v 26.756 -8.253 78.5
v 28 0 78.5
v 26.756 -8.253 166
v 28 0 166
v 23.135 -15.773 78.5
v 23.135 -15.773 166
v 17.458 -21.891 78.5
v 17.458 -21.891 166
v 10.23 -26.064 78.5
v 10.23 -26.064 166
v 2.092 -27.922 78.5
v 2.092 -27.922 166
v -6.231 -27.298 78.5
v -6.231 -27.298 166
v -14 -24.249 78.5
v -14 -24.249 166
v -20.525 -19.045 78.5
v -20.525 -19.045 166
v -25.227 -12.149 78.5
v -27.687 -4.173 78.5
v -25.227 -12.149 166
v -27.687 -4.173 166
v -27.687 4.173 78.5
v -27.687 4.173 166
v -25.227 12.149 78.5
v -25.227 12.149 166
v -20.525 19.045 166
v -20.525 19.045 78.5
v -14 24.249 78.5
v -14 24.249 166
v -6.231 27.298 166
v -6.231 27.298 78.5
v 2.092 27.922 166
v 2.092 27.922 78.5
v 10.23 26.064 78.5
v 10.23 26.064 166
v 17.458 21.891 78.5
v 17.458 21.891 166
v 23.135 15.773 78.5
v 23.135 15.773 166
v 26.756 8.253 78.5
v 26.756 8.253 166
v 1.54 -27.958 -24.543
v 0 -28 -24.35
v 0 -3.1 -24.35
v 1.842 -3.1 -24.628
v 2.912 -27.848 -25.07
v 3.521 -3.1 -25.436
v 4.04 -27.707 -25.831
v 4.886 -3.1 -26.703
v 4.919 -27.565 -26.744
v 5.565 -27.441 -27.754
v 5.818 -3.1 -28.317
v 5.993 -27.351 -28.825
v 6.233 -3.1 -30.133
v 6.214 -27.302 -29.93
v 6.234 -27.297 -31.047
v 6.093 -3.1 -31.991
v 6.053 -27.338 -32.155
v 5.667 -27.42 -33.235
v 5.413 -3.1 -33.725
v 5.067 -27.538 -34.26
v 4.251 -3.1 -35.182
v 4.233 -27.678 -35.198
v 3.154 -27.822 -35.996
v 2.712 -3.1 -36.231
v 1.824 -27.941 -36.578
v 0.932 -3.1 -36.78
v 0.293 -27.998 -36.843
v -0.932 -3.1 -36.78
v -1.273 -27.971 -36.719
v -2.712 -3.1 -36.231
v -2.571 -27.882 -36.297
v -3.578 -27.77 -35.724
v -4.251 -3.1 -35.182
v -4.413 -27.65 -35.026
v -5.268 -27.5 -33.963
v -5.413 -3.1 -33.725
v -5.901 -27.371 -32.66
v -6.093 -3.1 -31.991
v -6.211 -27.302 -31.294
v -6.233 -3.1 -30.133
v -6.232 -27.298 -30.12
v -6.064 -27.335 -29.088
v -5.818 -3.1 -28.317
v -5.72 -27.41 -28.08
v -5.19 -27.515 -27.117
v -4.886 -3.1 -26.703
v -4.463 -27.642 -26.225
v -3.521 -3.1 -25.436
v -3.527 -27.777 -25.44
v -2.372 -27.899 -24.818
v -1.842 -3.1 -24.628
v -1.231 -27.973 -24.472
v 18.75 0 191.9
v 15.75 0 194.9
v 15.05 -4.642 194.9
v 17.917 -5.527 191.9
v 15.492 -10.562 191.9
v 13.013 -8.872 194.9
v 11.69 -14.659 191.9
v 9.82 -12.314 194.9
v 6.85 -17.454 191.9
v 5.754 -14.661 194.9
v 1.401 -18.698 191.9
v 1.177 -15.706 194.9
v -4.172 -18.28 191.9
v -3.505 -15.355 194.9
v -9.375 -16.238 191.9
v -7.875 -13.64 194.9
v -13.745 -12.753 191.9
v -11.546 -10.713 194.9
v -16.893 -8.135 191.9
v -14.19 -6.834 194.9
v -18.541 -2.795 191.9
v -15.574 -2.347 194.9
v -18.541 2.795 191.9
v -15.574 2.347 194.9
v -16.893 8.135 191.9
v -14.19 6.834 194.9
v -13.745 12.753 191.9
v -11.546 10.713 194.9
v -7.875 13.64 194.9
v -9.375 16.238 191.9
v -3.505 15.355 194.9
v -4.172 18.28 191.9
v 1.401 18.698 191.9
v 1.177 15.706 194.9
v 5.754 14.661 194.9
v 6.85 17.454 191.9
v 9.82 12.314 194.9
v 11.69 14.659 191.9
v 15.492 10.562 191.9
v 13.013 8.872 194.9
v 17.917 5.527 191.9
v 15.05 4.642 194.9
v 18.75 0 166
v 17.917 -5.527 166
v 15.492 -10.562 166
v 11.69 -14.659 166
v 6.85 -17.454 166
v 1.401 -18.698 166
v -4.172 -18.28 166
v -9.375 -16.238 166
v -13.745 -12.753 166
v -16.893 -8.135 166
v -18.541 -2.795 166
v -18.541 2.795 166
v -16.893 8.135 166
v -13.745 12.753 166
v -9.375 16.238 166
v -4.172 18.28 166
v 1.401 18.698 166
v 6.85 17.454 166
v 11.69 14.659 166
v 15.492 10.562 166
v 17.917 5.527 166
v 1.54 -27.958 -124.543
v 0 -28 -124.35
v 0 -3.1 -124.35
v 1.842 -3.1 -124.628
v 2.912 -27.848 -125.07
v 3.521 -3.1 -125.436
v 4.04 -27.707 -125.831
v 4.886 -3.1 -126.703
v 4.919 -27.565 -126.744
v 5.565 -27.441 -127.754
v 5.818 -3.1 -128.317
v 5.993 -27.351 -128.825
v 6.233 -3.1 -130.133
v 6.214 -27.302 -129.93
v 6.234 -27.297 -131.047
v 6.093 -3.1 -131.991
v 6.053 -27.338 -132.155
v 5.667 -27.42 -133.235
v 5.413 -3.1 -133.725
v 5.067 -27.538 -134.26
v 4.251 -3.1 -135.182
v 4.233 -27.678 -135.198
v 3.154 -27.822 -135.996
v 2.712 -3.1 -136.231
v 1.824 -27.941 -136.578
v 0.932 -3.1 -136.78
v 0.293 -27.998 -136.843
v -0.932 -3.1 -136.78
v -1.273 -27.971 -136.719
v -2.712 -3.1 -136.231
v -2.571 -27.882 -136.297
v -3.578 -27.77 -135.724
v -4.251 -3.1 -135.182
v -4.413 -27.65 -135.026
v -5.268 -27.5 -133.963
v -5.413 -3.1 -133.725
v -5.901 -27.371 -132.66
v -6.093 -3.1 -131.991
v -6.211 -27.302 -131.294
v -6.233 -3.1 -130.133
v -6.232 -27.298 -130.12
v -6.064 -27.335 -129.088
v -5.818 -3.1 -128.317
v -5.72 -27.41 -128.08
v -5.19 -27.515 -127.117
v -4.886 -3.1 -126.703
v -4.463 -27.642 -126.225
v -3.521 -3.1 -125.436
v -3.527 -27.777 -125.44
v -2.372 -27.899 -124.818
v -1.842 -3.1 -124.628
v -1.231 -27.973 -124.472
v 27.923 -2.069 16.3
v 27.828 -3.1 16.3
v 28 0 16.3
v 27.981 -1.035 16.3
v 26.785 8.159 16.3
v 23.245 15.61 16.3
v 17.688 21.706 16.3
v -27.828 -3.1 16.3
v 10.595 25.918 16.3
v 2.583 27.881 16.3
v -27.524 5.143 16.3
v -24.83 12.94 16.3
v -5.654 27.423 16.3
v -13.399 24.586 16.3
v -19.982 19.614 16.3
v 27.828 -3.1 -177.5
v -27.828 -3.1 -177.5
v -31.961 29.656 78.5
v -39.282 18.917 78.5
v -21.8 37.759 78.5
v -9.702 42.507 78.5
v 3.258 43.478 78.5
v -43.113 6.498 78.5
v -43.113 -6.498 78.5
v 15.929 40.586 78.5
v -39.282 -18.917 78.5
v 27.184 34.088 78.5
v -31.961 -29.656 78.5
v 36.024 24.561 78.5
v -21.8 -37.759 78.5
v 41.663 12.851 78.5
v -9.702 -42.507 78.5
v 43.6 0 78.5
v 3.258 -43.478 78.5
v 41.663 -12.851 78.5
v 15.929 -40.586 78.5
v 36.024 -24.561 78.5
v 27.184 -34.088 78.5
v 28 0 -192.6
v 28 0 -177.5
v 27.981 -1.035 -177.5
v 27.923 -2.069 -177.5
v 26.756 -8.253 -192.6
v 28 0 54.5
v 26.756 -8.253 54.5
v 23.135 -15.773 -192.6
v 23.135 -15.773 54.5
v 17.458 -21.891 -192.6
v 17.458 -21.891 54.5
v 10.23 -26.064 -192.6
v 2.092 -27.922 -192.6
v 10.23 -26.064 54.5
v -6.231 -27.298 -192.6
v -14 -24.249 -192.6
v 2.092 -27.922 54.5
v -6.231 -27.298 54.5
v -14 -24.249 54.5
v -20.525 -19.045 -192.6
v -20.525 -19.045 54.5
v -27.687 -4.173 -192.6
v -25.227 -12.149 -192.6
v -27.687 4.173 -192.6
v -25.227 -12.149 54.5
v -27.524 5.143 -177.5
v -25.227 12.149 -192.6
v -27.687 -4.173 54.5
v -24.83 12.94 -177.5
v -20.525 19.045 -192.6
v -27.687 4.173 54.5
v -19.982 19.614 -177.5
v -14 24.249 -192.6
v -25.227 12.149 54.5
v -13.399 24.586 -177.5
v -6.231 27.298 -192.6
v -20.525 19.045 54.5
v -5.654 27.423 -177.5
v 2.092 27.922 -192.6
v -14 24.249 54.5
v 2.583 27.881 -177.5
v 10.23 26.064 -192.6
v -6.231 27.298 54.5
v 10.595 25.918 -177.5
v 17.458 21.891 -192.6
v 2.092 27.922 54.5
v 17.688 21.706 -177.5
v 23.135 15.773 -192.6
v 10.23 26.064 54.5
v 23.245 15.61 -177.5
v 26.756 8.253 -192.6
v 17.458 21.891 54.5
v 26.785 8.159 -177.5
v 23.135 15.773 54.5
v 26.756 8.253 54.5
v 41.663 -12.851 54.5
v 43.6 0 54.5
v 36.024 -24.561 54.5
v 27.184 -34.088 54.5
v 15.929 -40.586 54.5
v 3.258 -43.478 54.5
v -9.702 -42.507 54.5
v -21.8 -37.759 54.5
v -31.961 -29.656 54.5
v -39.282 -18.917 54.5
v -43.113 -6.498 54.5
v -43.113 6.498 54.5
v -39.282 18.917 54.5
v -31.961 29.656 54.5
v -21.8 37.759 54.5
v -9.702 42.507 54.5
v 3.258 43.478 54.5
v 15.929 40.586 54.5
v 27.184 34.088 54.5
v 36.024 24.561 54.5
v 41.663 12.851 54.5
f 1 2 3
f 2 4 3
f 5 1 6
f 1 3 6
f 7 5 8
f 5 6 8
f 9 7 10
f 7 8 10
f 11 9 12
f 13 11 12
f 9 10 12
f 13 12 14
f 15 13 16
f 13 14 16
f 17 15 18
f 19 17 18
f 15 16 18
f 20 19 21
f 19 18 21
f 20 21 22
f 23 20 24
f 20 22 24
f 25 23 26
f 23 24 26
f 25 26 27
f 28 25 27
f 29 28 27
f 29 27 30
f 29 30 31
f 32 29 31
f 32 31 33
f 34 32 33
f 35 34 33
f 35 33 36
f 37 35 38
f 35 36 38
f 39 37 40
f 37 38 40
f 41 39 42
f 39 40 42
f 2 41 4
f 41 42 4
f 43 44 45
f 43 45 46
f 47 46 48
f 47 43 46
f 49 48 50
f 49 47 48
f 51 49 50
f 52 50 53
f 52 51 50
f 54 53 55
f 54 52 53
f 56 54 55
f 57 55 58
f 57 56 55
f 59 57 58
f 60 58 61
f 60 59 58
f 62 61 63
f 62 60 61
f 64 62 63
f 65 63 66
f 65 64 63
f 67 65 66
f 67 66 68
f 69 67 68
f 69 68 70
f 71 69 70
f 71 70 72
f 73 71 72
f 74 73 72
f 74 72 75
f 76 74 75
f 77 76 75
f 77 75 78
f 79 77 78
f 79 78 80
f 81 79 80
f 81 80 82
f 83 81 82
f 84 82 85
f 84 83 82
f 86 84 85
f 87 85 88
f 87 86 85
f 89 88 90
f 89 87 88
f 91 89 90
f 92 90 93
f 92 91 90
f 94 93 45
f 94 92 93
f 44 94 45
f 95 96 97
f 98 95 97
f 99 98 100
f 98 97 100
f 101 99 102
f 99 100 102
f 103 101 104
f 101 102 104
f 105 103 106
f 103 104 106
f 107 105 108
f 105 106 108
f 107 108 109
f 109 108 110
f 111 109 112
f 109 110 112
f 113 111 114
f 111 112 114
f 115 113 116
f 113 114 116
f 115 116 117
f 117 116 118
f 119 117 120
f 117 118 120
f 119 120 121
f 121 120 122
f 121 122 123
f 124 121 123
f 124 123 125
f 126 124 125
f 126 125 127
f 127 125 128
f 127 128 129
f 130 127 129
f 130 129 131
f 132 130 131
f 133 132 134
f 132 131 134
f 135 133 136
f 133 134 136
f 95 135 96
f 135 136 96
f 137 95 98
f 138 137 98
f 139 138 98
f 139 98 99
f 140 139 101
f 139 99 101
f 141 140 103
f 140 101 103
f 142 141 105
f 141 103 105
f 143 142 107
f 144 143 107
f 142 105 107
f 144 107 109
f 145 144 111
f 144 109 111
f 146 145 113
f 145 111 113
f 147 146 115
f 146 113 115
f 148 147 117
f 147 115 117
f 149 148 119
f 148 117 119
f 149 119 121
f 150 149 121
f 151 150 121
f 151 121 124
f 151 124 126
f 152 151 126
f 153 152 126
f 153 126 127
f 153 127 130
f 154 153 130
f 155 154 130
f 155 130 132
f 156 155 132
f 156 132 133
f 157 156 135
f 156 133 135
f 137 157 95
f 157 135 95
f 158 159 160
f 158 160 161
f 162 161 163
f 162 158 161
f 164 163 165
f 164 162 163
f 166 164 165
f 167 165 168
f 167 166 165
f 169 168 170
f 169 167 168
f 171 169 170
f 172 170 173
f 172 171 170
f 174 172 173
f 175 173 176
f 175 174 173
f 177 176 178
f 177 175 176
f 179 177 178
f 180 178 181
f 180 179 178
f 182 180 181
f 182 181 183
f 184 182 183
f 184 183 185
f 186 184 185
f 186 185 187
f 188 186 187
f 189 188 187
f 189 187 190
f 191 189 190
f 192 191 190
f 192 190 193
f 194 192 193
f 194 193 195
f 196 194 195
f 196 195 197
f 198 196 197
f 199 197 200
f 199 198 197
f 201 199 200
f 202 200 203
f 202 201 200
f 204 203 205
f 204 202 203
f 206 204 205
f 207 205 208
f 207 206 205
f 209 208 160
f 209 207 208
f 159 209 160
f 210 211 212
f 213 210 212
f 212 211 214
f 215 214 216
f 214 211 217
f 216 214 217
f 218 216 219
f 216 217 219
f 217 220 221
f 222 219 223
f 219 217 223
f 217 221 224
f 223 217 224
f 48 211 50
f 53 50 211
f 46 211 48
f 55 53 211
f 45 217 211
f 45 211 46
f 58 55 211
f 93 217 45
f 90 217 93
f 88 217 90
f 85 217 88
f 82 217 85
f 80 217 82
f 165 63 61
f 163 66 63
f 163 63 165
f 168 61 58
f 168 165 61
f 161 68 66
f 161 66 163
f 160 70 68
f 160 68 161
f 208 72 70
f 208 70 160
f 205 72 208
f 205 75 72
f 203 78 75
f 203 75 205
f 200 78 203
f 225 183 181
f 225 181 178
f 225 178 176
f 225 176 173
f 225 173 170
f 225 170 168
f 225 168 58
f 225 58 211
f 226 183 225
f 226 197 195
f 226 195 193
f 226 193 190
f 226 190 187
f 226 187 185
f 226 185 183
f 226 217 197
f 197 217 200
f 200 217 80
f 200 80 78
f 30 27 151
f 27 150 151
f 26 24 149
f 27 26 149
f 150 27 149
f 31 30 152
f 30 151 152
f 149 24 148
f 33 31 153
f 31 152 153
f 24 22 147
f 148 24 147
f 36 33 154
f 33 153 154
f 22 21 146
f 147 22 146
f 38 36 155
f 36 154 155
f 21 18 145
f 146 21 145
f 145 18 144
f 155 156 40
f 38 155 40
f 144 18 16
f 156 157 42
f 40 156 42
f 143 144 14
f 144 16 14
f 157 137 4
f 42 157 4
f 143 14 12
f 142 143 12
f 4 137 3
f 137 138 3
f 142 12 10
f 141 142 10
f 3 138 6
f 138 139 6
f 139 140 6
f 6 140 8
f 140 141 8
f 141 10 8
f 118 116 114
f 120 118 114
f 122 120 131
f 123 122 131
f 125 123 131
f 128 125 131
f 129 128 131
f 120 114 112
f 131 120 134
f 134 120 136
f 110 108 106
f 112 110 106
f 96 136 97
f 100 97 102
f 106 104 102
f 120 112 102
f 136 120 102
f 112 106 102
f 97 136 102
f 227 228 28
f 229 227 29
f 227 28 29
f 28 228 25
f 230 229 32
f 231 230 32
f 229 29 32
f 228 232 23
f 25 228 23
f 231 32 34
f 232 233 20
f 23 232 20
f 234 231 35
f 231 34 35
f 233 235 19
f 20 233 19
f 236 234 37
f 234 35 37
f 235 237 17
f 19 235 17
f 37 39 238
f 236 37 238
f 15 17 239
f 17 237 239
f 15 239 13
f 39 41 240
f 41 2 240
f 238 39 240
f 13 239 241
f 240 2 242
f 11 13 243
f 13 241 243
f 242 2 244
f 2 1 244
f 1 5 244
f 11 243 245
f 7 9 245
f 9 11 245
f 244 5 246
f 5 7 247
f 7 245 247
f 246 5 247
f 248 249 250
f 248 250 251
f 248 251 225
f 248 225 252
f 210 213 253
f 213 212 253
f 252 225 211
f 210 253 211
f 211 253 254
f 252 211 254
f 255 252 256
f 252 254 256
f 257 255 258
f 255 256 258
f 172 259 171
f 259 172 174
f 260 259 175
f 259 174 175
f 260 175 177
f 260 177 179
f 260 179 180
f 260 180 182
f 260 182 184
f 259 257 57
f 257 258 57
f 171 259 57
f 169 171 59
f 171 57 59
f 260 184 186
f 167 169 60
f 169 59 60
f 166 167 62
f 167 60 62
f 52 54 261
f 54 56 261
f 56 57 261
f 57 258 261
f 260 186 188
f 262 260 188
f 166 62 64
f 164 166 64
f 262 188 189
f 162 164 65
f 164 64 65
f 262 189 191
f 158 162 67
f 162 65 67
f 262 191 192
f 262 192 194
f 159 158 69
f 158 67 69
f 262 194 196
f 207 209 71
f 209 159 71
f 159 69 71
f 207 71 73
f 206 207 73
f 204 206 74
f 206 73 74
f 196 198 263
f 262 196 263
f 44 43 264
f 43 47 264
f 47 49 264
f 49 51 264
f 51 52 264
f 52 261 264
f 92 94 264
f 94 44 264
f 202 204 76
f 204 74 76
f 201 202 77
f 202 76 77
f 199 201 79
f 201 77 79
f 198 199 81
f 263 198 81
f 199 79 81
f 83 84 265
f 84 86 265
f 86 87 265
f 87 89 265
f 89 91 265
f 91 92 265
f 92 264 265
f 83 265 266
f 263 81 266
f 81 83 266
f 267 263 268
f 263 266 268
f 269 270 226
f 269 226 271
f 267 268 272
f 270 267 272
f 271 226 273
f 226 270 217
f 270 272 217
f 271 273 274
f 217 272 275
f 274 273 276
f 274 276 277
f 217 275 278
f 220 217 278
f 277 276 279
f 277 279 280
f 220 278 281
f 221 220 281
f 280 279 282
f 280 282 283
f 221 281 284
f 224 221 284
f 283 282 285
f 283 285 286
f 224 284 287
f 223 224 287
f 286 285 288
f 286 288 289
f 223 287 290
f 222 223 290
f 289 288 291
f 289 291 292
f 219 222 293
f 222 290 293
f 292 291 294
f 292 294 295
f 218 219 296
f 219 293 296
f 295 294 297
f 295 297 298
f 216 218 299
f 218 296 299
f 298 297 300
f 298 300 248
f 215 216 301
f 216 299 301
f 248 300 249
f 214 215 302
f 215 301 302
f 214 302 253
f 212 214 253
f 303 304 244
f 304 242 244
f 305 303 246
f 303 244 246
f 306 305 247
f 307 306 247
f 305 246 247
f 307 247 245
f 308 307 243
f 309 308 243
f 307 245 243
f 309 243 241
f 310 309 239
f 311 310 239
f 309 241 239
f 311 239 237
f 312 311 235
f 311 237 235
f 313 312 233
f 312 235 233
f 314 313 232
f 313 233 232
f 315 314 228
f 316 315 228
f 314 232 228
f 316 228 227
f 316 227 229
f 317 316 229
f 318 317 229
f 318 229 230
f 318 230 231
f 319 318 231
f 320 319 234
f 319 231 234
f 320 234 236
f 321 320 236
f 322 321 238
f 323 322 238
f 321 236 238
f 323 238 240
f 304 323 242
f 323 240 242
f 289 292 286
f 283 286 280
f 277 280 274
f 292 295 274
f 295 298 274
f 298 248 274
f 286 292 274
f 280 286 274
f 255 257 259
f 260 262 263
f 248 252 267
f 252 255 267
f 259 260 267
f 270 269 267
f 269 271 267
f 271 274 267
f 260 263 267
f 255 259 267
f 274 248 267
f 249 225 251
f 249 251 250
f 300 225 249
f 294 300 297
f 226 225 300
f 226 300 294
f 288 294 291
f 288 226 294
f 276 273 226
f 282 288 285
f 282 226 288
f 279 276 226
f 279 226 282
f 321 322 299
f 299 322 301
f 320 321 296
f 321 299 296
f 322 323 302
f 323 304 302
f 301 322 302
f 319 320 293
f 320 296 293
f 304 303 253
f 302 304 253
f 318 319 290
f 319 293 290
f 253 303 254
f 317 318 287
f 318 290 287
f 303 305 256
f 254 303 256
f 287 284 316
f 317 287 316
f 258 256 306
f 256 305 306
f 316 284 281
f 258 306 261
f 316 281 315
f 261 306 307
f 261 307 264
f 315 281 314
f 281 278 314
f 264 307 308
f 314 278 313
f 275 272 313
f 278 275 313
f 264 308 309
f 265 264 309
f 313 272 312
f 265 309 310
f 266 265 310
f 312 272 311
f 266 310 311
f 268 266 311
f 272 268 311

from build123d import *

# Parameters (mm, degrees)
CUT_EXTRUDE1_DEPTH      = 205.420962722
CUT_EXTRUDE1_DEPTH_BACK = 205.420962722
SKETCH2_W               = 193.8
SKETCH2_H               = 37.910107369
CUT_EXTRUDE2_DEPTH      = 205.420962722
CUT_EXTRUDE2_DEPTH_BACK = 205.420962722
SKETCH3_R               = 6.25
CHAMFER1_SIZE           = 3


with BuildPart() as part:
    # Sketch1 → Revolve1 (revolve)
    with BuildSketch(Plane(origin=(0, 0, 0), x_dir=(0, 0, -1), z_dir=(1, 0, 0)), mode=Mode.PRIVATE) as revolve1_sk:
        Polygon((192.6, 0), (192.6, 28), (-54.5, 28), (-54.5, 43.6), (-78.5, 43.6), (-78.5, 28), (-166, 28), (-166, 18.75), (-194.9, 18.75), (-194.9, 0), align=None)
    revolve(revolve1_sk.sketch.rotate(Axis((0, 0, 76.367145791), (0, 0, -1)), 90), axis=Axis((0, 0, 76.367145791), (0, 0, -1)))

    # Sketch2 → Cut-Extrude1 (cut, two sides: drawn at the far end of the back side and taken through both)
    with BuildSketch(Plane(origin=(0, 0, 0), x_dir=(0, 0, -1), z_dir=(1, 0, 0)).offset(-CUT_EXTRUDE1_DEPTH_BACK)):
        with Locations((80.6, 15.855053684)):
            Rectangle(SKETCH2_W, SKETCH2_H)
    extrude(amount=CUT_EXTRUDE1_DEPTH + CUT_EXTRUDE1_DEPTH_BACK, mode=Mode.SUBTRACT)

    # Sketch3 → Cut-Extrude2 (cut, two sides: drawn at the far end of the back side and taken through both)
    with BuildSketch(Plane(origin=(0, 0, 0), x_dir=(1, 0, 0), z_dir=(0, 1, 0)).offset(-CUT_EXTRUDE2_DEPTH_BACK)):
        with Locations(Location((0, 30.6, 0), (0, 0, 270))):
            Circle(SKETCH3_R)
        with Locations(Location((0, 130.6, 0), (0, 0, 270))):
            Circle(SKETCH3_R)
    extrude(amount=CUT_EXTRUDE2_DEPTH + CUT_EXTRUDE2_DEPTH_BACK, mode=Mode.SUBTRACT)

    # Chamfer1
    chamfer1_edges = [part.edges().sort_by_distance(p)[0] for p in [
        (-18.75, 0, 194.9),
    ]]
    chamfer(chamfer1_edges, length=CHAMFER1_SIZE)


solid = part.part
